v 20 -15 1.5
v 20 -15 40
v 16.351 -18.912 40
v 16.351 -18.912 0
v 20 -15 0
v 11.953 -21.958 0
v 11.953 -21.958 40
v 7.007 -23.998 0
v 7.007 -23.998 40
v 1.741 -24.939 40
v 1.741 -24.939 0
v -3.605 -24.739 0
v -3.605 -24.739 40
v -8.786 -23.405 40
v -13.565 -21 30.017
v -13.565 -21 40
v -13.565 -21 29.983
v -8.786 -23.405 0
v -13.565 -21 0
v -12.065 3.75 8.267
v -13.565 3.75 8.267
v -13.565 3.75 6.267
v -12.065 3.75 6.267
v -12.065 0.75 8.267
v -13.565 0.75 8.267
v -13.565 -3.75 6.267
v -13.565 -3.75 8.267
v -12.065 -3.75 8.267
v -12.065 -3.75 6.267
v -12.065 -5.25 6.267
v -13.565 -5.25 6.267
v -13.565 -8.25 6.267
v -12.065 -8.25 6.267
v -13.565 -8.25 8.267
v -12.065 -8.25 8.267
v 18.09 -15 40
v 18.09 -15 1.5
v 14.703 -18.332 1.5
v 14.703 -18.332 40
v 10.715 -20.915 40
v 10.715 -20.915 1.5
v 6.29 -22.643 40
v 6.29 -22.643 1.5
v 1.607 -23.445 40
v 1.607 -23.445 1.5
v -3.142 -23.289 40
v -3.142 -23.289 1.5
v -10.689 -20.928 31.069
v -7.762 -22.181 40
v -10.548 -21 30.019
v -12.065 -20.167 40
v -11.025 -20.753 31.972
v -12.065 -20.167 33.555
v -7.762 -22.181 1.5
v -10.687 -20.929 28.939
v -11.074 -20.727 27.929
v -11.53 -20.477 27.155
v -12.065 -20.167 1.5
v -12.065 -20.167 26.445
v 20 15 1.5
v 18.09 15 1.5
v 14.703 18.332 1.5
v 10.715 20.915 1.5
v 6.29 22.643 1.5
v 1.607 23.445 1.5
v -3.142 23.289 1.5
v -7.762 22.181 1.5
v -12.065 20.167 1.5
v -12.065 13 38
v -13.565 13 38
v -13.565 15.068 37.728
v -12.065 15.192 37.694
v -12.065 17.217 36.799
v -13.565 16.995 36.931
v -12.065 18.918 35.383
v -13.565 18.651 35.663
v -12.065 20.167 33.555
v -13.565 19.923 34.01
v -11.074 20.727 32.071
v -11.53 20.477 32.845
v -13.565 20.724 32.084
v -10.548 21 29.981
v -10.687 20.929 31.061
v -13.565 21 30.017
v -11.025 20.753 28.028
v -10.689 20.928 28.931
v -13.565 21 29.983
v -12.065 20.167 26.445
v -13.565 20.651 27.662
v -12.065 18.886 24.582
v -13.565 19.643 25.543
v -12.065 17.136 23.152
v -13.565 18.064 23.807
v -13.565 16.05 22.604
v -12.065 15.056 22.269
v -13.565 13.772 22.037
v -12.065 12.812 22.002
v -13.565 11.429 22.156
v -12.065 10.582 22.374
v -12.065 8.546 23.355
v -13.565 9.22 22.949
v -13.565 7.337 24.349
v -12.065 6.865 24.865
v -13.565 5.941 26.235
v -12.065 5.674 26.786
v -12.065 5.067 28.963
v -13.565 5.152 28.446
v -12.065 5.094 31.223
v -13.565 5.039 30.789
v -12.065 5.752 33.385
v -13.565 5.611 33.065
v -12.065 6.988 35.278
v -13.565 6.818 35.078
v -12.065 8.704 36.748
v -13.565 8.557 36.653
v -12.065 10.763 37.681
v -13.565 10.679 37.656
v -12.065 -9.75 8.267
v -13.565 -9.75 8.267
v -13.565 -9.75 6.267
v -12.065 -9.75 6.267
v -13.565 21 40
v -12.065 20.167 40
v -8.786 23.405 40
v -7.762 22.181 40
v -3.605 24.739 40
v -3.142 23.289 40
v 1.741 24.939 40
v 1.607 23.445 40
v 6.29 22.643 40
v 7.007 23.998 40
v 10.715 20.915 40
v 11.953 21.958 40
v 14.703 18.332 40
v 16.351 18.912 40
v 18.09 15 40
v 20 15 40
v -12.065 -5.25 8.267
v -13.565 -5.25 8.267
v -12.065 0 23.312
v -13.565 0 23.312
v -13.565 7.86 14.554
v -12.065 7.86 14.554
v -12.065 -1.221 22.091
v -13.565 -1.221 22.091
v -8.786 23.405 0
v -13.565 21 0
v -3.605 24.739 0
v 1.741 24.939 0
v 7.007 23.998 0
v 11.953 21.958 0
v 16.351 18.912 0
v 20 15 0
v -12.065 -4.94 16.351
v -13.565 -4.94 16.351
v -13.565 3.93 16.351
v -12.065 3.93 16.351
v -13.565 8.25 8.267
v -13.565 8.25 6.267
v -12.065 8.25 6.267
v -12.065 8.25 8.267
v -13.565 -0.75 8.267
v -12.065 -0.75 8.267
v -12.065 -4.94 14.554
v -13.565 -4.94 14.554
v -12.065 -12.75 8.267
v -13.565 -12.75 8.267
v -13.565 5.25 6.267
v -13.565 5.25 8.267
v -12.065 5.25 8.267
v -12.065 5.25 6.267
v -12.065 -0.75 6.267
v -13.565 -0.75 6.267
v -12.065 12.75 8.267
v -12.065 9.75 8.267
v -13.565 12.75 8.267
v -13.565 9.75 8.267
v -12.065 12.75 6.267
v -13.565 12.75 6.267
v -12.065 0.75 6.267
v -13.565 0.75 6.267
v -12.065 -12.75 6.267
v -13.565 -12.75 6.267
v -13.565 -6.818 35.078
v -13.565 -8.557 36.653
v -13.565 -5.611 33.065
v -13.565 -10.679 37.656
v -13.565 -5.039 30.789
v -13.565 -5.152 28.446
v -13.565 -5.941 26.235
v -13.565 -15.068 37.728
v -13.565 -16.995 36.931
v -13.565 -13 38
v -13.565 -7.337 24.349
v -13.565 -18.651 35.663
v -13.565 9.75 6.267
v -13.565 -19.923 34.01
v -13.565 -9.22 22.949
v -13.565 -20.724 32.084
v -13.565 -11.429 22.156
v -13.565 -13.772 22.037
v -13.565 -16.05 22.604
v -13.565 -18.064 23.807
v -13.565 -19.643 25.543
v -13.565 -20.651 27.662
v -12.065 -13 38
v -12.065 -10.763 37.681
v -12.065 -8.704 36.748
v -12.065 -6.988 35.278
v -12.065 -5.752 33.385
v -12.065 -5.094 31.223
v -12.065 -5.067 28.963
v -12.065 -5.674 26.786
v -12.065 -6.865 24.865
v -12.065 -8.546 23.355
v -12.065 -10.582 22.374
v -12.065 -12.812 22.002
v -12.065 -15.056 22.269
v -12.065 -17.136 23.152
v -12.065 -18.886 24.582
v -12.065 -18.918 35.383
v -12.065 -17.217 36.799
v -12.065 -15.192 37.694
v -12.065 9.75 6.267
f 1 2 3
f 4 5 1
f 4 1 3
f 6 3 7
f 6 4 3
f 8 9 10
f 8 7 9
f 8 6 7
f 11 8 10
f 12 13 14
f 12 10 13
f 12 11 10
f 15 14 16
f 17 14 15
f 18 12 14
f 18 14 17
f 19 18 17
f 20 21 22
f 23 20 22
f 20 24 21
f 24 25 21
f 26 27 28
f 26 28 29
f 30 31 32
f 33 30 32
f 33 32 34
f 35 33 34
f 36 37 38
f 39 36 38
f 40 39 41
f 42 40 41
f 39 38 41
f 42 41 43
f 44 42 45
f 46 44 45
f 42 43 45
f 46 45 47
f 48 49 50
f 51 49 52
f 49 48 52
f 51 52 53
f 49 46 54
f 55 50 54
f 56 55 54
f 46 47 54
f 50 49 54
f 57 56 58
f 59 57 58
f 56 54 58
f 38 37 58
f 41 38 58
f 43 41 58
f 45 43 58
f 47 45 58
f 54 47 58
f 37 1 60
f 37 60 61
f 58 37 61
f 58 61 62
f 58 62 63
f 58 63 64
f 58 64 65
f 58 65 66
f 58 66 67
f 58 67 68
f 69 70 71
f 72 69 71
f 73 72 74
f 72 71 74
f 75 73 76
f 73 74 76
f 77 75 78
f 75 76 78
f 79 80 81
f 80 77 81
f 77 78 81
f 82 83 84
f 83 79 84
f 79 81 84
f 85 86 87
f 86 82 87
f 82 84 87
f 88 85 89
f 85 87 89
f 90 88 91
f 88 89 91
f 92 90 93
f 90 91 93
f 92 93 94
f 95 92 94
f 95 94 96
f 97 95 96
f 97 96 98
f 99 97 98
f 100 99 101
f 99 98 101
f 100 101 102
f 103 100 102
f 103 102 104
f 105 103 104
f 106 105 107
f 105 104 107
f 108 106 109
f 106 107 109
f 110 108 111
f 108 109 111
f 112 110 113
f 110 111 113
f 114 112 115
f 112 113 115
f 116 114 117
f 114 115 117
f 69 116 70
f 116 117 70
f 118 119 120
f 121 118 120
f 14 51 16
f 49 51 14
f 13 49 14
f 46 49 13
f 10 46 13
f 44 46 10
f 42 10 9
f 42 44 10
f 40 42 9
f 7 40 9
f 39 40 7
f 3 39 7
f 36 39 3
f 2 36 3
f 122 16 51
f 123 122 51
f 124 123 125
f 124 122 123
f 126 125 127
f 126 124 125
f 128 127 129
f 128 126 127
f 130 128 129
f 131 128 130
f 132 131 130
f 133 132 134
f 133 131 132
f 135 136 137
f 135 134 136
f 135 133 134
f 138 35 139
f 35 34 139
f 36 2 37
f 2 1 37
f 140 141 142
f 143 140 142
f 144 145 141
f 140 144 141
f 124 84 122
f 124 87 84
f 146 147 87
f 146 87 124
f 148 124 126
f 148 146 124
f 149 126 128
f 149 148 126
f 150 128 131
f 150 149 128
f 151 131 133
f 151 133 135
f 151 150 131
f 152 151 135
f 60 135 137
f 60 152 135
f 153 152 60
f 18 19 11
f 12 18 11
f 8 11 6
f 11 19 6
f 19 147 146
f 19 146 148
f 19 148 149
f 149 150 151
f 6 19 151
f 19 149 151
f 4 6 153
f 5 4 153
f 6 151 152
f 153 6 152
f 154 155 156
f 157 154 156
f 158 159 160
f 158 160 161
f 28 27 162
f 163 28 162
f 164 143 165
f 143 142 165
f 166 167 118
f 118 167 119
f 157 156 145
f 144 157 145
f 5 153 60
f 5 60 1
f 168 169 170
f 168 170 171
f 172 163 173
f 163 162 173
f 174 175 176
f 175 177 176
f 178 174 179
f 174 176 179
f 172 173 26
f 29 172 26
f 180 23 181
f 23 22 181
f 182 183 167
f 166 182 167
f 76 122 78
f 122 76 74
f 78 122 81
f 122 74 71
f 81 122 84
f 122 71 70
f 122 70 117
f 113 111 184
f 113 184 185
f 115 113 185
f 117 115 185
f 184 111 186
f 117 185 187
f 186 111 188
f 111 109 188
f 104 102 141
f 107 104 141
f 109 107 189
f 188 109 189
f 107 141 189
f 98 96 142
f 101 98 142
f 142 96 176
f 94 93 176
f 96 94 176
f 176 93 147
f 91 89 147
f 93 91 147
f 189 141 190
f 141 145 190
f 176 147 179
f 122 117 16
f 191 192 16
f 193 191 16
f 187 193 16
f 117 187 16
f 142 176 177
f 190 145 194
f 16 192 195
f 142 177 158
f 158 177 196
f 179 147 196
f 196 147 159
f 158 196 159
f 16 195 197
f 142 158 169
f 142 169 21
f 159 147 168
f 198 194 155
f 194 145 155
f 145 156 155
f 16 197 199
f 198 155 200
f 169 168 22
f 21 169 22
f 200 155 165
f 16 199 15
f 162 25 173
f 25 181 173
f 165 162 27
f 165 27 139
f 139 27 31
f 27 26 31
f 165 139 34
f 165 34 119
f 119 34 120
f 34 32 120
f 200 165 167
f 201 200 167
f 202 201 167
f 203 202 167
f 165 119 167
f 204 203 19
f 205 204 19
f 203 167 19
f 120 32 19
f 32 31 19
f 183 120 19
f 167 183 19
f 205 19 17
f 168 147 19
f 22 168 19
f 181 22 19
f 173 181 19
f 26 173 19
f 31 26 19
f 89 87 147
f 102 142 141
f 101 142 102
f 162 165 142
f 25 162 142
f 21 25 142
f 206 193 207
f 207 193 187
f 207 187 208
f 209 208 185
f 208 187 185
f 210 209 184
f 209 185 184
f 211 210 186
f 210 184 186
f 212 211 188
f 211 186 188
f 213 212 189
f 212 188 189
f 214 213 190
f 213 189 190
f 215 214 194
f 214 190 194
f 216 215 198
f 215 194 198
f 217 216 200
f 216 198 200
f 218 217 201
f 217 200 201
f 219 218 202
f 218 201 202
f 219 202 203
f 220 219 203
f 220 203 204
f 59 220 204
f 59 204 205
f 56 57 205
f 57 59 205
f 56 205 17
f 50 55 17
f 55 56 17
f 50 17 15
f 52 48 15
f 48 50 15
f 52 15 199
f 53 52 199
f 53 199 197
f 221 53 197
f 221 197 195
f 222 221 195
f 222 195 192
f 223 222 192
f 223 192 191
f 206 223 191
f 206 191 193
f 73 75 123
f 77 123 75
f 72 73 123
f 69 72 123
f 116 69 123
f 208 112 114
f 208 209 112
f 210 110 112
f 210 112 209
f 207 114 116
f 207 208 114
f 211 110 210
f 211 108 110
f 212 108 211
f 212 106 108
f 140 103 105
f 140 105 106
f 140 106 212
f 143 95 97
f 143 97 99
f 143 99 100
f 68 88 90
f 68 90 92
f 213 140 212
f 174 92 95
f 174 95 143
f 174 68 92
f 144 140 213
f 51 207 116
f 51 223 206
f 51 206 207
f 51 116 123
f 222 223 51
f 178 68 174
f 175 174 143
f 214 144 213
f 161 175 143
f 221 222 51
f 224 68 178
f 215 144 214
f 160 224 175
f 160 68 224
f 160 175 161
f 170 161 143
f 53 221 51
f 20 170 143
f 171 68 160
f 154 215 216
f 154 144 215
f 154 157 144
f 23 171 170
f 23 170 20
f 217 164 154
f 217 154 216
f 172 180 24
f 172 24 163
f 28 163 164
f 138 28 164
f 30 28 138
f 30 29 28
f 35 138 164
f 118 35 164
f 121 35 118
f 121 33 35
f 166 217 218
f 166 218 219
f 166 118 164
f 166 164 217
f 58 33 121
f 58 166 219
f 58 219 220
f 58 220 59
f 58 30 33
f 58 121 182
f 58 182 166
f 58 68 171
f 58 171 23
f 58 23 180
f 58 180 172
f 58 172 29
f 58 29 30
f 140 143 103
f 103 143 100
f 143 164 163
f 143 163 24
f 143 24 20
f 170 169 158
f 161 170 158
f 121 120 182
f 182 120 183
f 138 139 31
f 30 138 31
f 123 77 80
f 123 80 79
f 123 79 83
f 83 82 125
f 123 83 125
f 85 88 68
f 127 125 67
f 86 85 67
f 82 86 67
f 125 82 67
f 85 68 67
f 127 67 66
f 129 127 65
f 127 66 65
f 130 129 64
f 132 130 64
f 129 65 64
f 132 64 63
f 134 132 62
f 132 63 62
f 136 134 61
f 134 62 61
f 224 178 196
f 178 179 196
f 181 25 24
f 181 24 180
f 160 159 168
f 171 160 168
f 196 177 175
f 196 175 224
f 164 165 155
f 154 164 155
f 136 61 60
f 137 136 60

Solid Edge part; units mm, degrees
sketch "Sketch1" plane through (0, 0, 0) normal (0, 0, 1) x (1, 0, 0)
  line L0 (-13.5647, 21) -> (-13.5647, -21)
  line L1 (20, 15) -> (20, -15)
  arc A0 (-13.5647, 21) -> (20, 15) centre (0, 0) cw
  arc A1 (-13.5647, -21) -> (20, -15) centre (0, 0) ccw
  dimension "D1" = 50
  dimension "D2" = 42
  dimension "D3" = 30
extrude "Protrusion1" add sketch "Sketch1" along normal blind 40
shell "Espesor_1" thickness 1.5 removed faces 1 at (-8.3062, -16.1667, 40)
hole "Agujero_1" at (-13.5647, 13, 30) direction (1, 0, 0) diameter 16 end up to next
hole "Hole1" at (-13.5647, -13, 30) direction (1, 0, 0) diameter 16 end up to next
sketch "Sketch2" plane through (-13.5647, 0, 20) normal (-1, 0, 0) x (0, -1, 0)
  line L0 (0, 3.3123) -> (-7.8596, -5.4456)
  line L1 (-7.8596, -5.4456) -> (4.9404, -5.4456)
  line L2 (4.9404, -5.4456) -> (4.9404, -3.6491)
  line L3 (4.9404, -3.6491) -> (-3.9298, -3.6491)
  line L4 (-3.9298, -3.6491) -> (1.2214, 2.0908)
  line L5 (1.2214, 2.0908) -> (0, 3.3123)
  line L6 (9.75, -13.7333) -> (12.75, -13.7333)
  line L7 (12.75, -13.7333) -> (12.75, -11.7333)
  line L8 (12.75, -11.7333) -> (9.75, -11.7333)
  line L9 (9.75, -11.7333) -> (9.75, -13.7333)
  line L10 (-12.75, -11.7333) -> (-12.75, -13.7333)
  line L11 (-12.75, -13.7333) -> (-9.75, -13.7333)
  line L12 (-9.75, -11.7333) -> (-9.75, -13.7333)
  line L13 (-9.75, -11.7333) -> (-12.75, -11.7333)
  line L14 (-8.25, -13.7333) -> (-8.25, -11.7333)
  line L15 (-5.25, -11.7333) -> (-8.25, -11.7333)
  line L16 (-5.25, -11.7333) -> (-5.25, -13.7333)
  line L17 (-8.25, -13.7333) -> (-5.25, -13.7333)
  line L18 (-0.75, -11.7333) -> (-0.75, -13.7333)
  line L19 (-3.75, -13.7333) -> (-0.75, -13.7333)
  line L20 (-3.75, -11.7333) -> (-3.75, -13.7333)
  line L21 (-0.75, -11.7333) -> (-3.75, -11.7333)
  line L22 (8.25, -13.7333) -> (8.25, -11.7333)
  line L23 (8.25, -11.7333) -> (5.25, -11.7333)
  line L24 (5.25, -11.7333) -> (5.25, -13.7333)
  line L25 (5.25, -13.7333) -> (8.25, -13.7333)
  line L26 (0.75, -11.7333) -> (0.75, -13.7333)
  line L27 (0.75, -13.7333) -> (3.75, -13.7333)
  line L28 (3.75, -11.7333) -> (3.75, -13.7333)
  line L29 (3.75, -11.7333) -> (0.75, -11.7333)
  dimension "D1" = 1.5
  dimension "D2" = 1.5
  dimension "D3" = 1.5
  dimension "D4" = 2
  dimension "D5" = 3
extrude "Cutout1" cut sketch "Sketch2" against normal up to next
sketch "Sketch3" plane through (3.2177, 0, 1.5) normal (0, 0, 1) x (0, -1, 0)
  line L0 (15, 13.7823) -> (-15, 13.7823)
  line L1 (-15, 13.7823) -> (-15, 16.7823)
  line L2 (-15, 16.7823) -> (15, 16.7823)
  line L3 (15, 16.7823) -> (15, 13.7823)
extrude "Cutout2" cut sketch "Sketch3" along normal up to next
